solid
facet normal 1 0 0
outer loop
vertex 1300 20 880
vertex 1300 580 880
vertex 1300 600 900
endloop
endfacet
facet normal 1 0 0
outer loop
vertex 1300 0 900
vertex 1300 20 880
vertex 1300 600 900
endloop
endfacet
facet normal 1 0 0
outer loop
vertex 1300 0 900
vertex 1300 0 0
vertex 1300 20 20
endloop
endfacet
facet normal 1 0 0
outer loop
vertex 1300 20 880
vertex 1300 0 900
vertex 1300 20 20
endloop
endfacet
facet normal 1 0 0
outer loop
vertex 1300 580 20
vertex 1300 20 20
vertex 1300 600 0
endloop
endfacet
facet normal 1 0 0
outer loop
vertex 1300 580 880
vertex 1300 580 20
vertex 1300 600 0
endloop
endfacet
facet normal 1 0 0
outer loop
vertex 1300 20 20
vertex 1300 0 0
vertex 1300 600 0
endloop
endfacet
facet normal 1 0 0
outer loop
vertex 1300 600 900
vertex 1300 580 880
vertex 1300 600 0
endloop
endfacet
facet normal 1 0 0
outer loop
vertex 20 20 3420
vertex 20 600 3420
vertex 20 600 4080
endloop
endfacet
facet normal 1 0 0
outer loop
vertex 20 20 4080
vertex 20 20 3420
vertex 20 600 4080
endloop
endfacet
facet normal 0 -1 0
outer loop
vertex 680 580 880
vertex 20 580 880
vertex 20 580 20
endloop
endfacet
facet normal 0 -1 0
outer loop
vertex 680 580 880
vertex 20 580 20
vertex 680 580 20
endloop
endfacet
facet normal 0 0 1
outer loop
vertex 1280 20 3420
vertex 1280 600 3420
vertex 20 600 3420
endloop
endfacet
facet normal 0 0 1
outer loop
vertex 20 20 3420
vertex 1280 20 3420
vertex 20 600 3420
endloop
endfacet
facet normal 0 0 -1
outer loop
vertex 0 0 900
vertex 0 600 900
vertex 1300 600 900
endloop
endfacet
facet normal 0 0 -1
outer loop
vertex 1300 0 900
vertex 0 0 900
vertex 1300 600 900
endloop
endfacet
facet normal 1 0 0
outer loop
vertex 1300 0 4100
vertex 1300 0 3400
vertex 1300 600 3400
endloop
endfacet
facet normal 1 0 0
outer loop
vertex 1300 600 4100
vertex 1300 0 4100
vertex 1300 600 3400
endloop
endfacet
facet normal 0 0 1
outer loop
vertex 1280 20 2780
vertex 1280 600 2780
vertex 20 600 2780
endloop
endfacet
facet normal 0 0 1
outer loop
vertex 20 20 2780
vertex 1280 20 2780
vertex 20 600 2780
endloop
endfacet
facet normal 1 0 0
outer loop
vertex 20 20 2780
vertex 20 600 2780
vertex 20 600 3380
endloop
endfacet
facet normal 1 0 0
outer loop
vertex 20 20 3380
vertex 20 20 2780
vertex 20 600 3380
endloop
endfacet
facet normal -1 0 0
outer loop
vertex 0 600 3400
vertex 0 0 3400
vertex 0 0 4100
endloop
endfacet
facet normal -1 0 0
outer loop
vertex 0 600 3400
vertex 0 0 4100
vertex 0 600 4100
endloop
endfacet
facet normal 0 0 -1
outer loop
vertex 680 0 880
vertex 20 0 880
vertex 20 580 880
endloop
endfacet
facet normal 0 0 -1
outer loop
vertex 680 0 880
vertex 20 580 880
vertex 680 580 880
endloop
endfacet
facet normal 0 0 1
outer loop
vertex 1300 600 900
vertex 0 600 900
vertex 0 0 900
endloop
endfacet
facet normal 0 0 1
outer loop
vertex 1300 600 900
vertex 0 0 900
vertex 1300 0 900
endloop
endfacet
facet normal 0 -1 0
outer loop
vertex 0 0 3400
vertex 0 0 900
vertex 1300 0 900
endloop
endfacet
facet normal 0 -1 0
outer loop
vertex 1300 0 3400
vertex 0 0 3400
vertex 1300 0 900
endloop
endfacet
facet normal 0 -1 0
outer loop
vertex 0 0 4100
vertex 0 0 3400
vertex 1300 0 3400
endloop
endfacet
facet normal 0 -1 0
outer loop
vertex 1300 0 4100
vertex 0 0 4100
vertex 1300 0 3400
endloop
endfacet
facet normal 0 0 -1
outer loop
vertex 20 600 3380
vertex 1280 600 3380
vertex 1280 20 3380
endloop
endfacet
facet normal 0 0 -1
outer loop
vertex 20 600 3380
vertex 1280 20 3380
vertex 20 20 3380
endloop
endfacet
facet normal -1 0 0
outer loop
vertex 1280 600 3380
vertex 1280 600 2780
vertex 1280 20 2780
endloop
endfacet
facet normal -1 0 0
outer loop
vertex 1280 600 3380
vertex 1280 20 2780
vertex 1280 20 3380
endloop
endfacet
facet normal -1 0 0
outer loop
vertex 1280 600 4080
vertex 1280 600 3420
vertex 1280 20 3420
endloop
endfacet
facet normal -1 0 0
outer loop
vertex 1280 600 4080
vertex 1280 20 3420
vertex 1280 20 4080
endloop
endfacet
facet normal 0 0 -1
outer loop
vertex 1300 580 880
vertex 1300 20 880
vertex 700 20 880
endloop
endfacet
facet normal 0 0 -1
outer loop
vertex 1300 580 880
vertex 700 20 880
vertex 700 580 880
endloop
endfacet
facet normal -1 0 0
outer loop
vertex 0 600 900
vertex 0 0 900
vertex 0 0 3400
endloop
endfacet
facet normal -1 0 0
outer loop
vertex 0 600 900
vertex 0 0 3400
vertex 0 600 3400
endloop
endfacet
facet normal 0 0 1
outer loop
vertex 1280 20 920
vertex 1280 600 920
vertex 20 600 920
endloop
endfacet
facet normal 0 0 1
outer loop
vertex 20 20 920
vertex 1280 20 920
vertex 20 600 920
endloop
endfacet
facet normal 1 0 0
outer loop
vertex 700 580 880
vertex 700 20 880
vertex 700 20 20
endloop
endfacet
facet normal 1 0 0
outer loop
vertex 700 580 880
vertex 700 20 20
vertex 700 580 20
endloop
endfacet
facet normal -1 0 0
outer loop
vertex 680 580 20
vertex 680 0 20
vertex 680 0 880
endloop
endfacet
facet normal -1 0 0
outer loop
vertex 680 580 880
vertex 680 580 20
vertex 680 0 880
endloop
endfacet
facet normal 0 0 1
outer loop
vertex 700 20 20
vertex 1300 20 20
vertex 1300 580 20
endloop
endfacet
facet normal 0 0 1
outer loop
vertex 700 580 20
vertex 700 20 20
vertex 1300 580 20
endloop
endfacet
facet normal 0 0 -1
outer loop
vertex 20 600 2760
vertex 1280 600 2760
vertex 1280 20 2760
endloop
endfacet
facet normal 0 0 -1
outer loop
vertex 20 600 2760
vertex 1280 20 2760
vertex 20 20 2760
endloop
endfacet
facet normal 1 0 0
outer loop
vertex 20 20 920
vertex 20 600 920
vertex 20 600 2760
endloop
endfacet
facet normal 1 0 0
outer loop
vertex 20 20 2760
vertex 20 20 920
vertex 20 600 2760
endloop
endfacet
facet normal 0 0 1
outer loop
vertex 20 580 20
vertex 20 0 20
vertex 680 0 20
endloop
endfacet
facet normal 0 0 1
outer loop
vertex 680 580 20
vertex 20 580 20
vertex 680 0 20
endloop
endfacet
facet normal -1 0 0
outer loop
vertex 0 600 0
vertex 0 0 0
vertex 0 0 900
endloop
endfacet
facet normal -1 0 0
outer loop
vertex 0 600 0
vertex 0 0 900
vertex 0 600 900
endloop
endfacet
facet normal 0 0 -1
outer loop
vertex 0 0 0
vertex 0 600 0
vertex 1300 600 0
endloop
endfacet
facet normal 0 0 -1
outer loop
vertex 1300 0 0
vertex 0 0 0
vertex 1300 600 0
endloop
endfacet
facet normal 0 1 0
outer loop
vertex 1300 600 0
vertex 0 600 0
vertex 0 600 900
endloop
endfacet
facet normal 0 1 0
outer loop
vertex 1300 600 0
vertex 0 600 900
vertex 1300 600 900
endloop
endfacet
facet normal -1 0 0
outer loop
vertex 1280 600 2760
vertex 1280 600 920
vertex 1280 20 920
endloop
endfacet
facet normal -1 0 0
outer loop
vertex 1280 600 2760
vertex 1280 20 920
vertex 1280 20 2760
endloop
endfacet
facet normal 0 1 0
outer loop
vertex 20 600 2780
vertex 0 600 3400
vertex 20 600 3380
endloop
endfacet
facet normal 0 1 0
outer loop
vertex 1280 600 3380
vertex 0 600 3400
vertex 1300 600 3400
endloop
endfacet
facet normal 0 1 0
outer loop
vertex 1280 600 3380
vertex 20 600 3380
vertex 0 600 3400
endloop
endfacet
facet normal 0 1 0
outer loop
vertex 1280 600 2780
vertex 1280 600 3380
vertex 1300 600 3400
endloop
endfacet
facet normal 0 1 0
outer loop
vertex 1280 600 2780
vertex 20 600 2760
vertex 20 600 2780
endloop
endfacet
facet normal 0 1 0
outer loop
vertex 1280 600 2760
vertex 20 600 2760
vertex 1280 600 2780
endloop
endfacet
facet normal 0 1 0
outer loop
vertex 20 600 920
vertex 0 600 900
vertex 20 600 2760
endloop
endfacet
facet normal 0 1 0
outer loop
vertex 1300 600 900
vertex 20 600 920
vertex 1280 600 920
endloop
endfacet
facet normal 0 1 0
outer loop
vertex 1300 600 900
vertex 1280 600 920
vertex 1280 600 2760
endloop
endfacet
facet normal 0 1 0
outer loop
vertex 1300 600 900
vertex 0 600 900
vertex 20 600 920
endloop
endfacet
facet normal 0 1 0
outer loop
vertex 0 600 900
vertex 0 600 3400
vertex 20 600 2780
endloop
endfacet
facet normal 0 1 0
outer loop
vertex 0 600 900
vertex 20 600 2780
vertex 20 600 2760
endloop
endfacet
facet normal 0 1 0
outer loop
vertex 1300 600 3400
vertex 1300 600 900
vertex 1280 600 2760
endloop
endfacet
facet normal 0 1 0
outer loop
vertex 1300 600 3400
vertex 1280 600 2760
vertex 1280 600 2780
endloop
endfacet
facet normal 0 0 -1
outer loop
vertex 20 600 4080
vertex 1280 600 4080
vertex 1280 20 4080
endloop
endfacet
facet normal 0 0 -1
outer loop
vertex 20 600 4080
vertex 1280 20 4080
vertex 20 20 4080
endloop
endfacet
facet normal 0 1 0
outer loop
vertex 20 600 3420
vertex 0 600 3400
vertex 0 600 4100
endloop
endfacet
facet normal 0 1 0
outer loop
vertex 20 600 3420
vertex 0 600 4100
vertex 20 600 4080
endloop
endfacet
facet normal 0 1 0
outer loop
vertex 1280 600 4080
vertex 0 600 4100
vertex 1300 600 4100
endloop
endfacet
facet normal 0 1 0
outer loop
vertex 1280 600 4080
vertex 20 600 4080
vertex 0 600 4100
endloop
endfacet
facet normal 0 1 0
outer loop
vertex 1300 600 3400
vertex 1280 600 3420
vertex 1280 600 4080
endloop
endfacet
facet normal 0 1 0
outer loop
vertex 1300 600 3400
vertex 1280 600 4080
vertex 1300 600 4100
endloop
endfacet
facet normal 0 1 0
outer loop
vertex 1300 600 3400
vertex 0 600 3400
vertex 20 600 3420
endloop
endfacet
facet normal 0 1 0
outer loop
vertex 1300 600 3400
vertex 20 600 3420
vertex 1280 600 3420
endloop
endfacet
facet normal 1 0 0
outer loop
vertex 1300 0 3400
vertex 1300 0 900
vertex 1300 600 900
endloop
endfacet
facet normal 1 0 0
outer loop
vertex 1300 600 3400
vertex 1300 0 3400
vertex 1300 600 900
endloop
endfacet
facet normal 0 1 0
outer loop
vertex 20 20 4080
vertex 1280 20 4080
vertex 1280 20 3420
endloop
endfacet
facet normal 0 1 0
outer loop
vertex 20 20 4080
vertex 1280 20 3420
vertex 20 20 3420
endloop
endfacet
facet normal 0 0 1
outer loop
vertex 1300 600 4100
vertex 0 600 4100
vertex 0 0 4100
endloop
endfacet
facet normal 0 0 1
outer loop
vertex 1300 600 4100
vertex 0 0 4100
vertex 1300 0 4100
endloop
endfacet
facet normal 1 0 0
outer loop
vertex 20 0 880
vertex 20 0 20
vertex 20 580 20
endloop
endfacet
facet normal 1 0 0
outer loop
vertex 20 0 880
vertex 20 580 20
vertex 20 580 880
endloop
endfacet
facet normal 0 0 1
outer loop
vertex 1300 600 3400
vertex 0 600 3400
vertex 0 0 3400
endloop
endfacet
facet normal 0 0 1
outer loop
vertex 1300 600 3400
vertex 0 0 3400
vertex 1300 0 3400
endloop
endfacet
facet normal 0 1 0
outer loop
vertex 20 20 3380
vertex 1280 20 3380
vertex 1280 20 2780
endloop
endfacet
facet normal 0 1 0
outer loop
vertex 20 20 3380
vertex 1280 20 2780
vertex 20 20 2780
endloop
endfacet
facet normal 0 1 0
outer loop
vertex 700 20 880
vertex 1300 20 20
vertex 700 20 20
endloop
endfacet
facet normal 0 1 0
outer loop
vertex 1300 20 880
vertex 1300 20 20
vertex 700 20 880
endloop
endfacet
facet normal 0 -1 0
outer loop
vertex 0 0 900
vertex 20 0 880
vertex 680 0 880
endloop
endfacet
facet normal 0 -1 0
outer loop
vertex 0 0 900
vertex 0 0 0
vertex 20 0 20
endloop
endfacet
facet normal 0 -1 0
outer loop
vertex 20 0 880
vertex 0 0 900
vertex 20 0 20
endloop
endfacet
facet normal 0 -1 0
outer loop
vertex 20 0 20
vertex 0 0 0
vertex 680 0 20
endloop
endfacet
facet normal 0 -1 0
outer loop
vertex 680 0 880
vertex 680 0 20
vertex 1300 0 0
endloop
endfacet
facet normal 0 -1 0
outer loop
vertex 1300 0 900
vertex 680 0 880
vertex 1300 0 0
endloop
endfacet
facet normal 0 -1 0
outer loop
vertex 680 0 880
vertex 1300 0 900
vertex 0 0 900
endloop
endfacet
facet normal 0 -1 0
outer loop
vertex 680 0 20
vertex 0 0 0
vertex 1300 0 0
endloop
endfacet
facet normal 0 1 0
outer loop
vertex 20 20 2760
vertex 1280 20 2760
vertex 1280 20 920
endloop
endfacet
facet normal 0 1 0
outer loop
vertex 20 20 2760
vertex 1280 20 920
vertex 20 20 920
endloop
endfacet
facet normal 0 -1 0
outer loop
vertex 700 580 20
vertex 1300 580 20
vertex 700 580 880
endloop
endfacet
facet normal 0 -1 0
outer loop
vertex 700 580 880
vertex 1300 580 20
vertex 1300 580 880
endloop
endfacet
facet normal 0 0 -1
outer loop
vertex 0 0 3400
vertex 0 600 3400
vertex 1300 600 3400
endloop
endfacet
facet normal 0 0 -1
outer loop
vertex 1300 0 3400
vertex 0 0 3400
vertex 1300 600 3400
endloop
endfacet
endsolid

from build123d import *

# Parameters (mm, degrees)
F0_W      = 1300
F0_H      = 600
F1_DEPTH  = 900
F2_W      = 560
F2_H      = 860
F3_DEPTH  = 600
F4_W      = 660
F4_H      = 860
F5_DEPTH  = 580
F6_DEPTH  = 2500
F7_W      = 1260
F7_H      = 600
F8_DEPTH  = 580
F9_W      = 1260
F9_H      = 1840
F10_DEPTH = 580
F11_W     = 1300
F11_H     = 600
F12_DEPTH = 700
F13_W     = 1260
F13_H     = 660
F14_DEPTH = 580


with BuildPart() as f1:
    # F0 (on Top) → F1 (new body)
    with BuildSketch(Plane.XY):
        with Locations((650, 300)):
            Rectangle(F0_W, F0_H)
    extrude(amount=F1_DEPTH)

    # F2 (on face) → F3 (cut)
    with BuildSketch(Plane.YZ.offset(1300)):
        with Locations((300, 450)):
            Rectangle(F2_W, F2_H)
    extrude(amount=-F3_DEPTH, mode=Mode.SUBTRACT)

    # F4 (on face) → F5 (cut)
    with BuildSketch(Plane.XZ):
        with Locations((350, 450)):
            Rectangle(F4_W, F4_H)
    extrude(amount=-F5_DEPTH, mode=Mode.SUBTRACT)


with BuildPart() as f6:
    # F6 (new): a face of the model
    f6_faces = [f1.part.faces().sort_by_distance(p)[0] for p in [
        (650, 300, 900),
    ]]
    extrude(f6_faces, amount=F6_DEPTH)

    # F7 (on face) → F8 (cut)
    with BuildSketch(Plane(origin=(0, 600, 0), x_dir=(-1, 0, 0), z_dir=(0, 1, 0))):
        with Locations((-650, 3080)):
            Rectangle(F7_W, F7_H)
    extrude(amount=-F8_DEPTH, mode=Mode.SUBTRACT)

    # F9 (on face) → F10 (cut)
    with BuildSketch(Plane(origin=(0, 600, 0), x_dir=(-1, 0, 0), z_dir=(0, 1, 0))):
        with Locations((-650, 1840)):
            Rectangle(F9_W, F9_H)
    extrude(amount=-F10_DEPTH, mode=Mode.SUBTRACT)


with BuildPart() as f12:
    # F11 (on face) → F12 (new body)
    with BuildSketch(Plane.XY.offset(3400)):
        with Locations((650, 300)):
            Rectangle(F11_W, F11_H)
    extrude(amount=F12_DEPTH)

    # F13 (on face) → F14 (cut)
    with BuildSketch(Plane(origin=(0, 600, 0), x_dir=(-1, 0, 0), z_dir=(0, 1, 0))):
        with Locations((-650, 3750)):
            Rectangle(F13_W, F13_H)
    extrude(amount=-F14_DEPTH, mode=Mode.SUBTRACT)


solid = Compound([f1.part, f6.part, f12.part])
